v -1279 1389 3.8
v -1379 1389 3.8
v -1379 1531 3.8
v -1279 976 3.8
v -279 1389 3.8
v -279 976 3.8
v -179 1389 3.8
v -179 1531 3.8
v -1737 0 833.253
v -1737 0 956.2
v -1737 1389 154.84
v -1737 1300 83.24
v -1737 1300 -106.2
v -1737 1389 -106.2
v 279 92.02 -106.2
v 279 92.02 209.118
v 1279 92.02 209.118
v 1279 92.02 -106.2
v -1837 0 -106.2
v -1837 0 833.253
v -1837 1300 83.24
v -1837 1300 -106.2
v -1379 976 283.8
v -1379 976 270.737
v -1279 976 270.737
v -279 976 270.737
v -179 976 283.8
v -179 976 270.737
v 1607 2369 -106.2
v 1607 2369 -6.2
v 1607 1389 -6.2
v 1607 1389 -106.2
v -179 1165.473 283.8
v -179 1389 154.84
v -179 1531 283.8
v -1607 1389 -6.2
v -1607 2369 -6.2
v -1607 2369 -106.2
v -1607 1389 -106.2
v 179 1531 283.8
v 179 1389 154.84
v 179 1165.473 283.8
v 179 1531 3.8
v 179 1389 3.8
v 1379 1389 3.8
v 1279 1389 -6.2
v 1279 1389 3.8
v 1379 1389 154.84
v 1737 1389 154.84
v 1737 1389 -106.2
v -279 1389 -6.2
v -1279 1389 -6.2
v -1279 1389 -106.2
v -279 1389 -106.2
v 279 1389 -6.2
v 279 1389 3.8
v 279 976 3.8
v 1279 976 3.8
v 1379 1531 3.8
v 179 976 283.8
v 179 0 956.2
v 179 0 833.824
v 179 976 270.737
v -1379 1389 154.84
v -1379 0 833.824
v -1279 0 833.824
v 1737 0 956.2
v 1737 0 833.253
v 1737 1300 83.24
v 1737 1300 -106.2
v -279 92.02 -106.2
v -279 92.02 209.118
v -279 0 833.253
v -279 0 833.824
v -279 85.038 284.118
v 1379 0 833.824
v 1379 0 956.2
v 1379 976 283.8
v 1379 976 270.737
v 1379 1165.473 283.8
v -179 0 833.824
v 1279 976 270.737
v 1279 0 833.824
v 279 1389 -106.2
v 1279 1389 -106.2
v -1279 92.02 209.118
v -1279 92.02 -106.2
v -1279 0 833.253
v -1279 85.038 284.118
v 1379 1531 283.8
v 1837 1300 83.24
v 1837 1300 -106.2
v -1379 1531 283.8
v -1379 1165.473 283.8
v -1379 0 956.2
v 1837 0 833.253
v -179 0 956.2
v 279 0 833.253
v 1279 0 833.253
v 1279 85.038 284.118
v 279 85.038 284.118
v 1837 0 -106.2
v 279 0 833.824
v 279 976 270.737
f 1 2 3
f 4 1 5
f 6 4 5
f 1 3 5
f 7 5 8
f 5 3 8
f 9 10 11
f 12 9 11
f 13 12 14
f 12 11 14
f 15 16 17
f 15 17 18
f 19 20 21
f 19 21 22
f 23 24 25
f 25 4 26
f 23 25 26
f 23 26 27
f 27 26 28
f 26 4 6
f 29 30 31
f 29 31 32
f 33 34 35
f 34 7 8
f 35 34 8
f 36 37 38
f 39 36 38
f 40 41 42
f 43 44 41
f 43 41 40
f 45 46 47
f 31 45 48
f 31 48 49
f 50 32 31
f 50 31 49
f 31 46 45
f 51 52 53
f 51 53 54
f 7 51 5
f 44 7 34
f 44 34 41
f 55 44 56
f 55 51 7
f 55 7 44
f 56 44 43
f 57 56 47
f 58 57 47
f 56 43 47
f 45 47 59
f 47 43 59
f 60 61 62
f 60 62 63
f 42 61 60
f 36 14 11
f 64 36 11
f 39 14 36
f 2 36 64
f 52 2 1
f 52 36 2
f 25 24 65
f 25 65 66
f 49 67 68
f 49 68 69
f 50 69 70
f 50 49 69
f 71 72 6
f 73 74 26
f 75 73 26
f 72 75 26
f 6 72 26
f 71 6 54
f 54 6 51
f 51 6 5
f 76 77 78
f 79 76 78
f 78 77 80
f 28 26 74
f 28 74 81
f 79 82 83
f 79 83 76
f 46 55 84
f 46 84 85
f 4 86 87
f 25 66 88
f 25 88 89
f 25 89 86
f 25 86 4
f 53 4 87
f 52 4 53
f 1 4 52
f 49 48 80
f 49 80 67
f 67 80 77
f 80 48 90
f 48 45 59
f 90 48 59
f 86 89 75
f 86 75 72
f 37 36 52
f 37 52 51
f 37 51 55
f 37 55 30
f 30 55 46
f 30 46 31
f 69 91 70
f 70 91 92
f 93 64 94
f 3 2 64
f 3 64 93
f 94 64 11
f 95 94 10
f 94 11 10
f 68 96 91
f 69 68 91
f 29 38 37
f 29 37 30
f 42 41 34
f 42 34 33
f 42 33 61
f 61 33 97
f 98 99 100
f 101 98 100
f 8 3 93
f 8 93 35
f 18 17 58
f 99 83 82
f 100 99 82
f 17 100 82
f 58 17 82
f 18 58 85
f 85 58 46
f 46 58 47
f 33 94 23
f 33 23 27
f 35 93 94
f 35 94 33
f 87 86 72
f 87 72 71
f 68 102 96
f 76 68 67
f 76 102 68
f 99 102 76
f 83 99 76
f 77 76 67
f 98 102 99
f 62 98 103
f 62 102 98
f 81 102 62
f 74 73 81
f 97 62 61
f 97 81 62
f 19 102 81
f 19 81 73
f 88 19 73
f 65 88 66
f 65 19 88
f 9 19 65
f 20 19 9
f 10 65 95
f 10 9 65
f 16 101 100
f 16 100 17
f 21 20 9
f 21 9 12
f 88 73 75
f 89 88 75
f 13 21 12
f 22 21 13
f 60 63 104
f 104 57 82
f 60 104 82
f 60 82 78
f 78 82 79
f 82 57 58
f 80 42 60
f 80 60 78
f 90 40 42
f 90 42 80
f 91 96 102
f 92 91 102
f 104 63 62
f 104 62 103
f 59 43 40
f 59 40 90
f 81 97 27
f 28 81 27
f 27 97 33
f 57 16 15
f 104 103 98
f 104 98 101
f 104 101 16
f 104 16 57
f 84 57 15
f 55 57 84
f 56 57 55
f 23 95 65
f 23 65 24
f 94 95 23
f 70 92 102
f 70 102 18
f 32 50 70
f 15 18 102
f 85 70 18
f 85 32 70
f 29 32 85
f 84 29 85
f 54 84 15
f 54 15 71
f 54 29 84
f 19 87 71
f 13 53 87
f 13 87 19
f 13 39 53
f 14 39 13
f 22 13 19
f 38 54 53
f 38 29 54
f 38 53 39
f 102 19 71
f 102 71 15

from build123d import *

# Parameters (mm, degrees)
SKETCH_1_W           = 3674
SKETCH_1_H           = 1912.4
EXTRUDE_1_DEPTH      = 1389
CUT_EXTRUDE_1_DEPTH  = 3675
CUT_EXTRUDE_3_DEPTH  = 100
CUT_EXTRUDE_START    = -3674
CUT_EXTRUDE_4_DEPTH  = 100
SKETCH_6_W           = 3214
SKETCH_6_H           = 950
EXTRUDE_2_DEPTH      = 980
SKETCH_7_W           = 100
SKETCH_7_H           = 1603.589364395
CUT_EXTRUDE_5_DEPTH  = 106
SKETCH_8_W           = 1000
SKETCH_8_H           = 1389
CUT_EXTRUDE_6_DEPTH  = 1913.4
SKETCH_9_W           = 100
SKETCH_9_H           = 1603.589364395
CUT_EXTRUDE_7_DEPTH  = 106
SKETCH_11_W          = 100
SKETCH_11_H          = 1603.589364395
CUT_EXTRUDE_8_DEPTH  = 106
SKETCH_14_W          = 1000
SKETCH_14_H          = 1389
CUT_EXTRUDE_9_DEPTH  = 1913.4
SKETCH_16_W          = 100
SKETCH_16_H          = 1603.589364395
CUT_EXTRUDE_10_DEPTH = 106
SKETCH_18_W          = 1200
SKETCH_18_H          = 555
CUT_EXTRUDE_11_DEPTH = 953.4
SKETCH_18_2_W        = 1200
SKETCH_18_2_H        = 555
EXTRUDE_3_DEPTH      = 280
EXTRUDE_4_DEPTH      = 1000
EXTRUDE_START        = 1558
EXTRUDE_5_DEPTH      = 1000
SKETCH_23_W          = 3674
SKETCH_23_H          = 2369
CUT_EXTRUDE_12_DEPTH = 850


with BuildPart() as part:
    # 草图1 → 凸台-拉伸1 (new body)
    with BuildSketch(Plane(origin=(0, 0, 0), x_dir=(1, 0, 0), z_dir=(0, 1, 0))):
        Rectangle(SKETCH_1_W, SKETCH_1_H)
    extrude(amount=EXTRUDE_1_DEPTH)

    # 草图2 → 切除-拉伸1 (cut, through all)
    with BuildSketch(Plane.ZY.offset(1837)):
        Polygon((154.84, 1389), (956.2, 0), (956.2, 1389), align=None)
    extrude(amount=-CUT_EXTRUDE_1_DEPTH, mode=Mode.SUBTRACT)

    # 草图5 → 切除-拉伸3 (cut)
    with BuildSketch(Plane(origin=(1837, 0, 0), x_dir=(0, 0, -1), z_dir=(1, 0, 0))):
        Polygon((-154.84, 1389), (-956.2, 0), (-833.252958963, 0), (-83.24, 1300), (956.2, 1300), (956.2, 1389), align=None)
    extrude(amount=-CUT_EXTRUDE_3_DEPTH, mode=Mode.SUBTRACT)

    # 草图5<2> → 切除-拉伸4 (cut)
    with BuildSketch(Plane(origin=(1837, 0, 0), x_dir=(0, 0, -1), z_dir=(1, 0, 0)).offset(CUT_EXTRUDE_START)):
        Polygon((-154.84, 1389), (-956.2, 0), (-833.252958963, 0), (-83.24, 1300), (956.2, 1300), (956.2, 1389), align=None)
    extrude(amount=CUT_EXTRUDE_4_DEPTH, mode=Mode.SUBTRACT)

    # 草图6 → 凸台-拉伸2 (add)
    with BuildSketch(Plane(origin=(0, 1389, 0), x_dir=(1, 0, 0), z_dir=(0, 1, 0))):
        with Locations((0, 481.2)):
            Rectangle(SKETCH_6_W, SKETCH_6_H)
    extrude(amount=EXTRUDE_2_DEPTH)

    # 草图7 → 切除-拉伸5 (cut)
    with BuildSketch(Plane(origin=(0, 413.897031381, 717.409125222), x_dir=(1, 0, 0), z_dir=(0, 0.499728932, 0.866181849))):
        with Locations((-1329, 323.953877679)):
            Rectangle(SKETCH_7_W, SKETCH_7_H)
    extrude(amount=-CUT_EXTRUDE_5_DEPTH, mode=Mode.SUBTRACT)

    # 草图8 → 切除-拉伸6 (cut, through all)
    with BuildSketch(Plane.XY.offset(956.2)):
        with Locations((-779, 694.5)):
            Rectangle(SKETCH_8_W, SKETCH_8_H)
    extrude(amount=-CUT_EXTRUDE_6_DEPTH, mode=Mode.SUBTRACT)

    # 草图9 → 切除-拉伸7 (cut)
    with BuildSketch(Plane(origin=(0, 413.897031381, 717.409125222), x_dir=(1, 0, 0), z_dir=(0, 0.499728932, 0.866181849))):
        with Locations((-229, 323.953877679)):
            Rectangle(SKETCH_9_W, SKETCH_9_H)
    extrude(amount=-CUT_EXTRUDE_7_DEPTH, mode=Mode.SUBTRACT)

    # 草图11 → 切除-拉伸8 (cut)
    with BuildSketch(Plane(origin=(0, 413.897031381, 717.409125222), x_dir=(1, 0, 0), z_dir=(0, 0.499728932, 0.866181849))):
        with Locations((229, 323.953877679)):
            Rectangle(SKETCH_11_W, SKETCH_11_H)
    extrude(amount=-CUT_EXTRUDE_8_DEPTH, mode=Mode.SUBTRACT)

    # 草图14 → 切除-拉伸9 (cut, through all)
    with BuildSketch(Plane.XY.offset(956.2)):
        with Locations((779, 694.5)):
            Rectangle(SKETCH_14_W, SKETCH_14_H)
    extrude(amount=-CUT_EXTRUDE_9_DEPTH, mode=Mode.SUBTRACT)

    # 草图16 → 切除-拉伸10 (cut)
    with BuildSketch(Plane(origin=(0, 413.897031381, 717.409125222), x_dir=(1, 0, 0), z_dir=(0, 0.499728932, 0.866181849))):
        with Locations((1329, 323.953877679)):
            Rectangle(SKETCH_16_W, SKETCH_16_H)
    extrude(amount=-CUT_EXTRUDE_10_DEPTH, mode=Mode.SUBTRACT)

    # 草图18 → 切除-拉伸11 (cut, through all)
    with BuildSketch(Plane.XY.offset(3.8)):
        with Locations((-779, 1253.5)):
            Rectangle(SKETCH_18_W, SKETCH_18_H)
        with Locations((779, 1253.5)):
            Rectangle(SKETCH_18_W, SKETCH_18_H)
    extrude(amount=CUT_EXTRUDE_11_DEPTH, mode=Mode.SUBTRACT)

    # 草图18<2> → 凸台-拉伸3 (add)
    with BuildSketch(Plane.XY.offset(3.8)):
        with Locations((-779, 1253.5)):
            Rectangle(SKETCH_18_2_W, SKETCH_18_2_H)
        with Locations((779, 1253.5)):
            Rectangle(SKETCH_18_2_W, SKETCH_18_2_H)
    extrude(amount=EXTRUDE_3_DEPTH)

    # 草图21 → 凸台-拉伸4 (add)
    with BuildSketch(Plane(origin=(-1279, 0, 0), x_dir=(0, 0, -1), z_dir=(1, 0, 0))):
        Polygon((-833.252958963, 0), (-284.1184014, 85.038227225), (-209.1184014, 92.02), (956.2, 92.02), (956.2, 0), align=None)
    extrude(amount=EXTRUDE_4_DEPTH)

    # 草图21<2> → 凸台-拉伸5 (add)
    with BuildSketch(Plane(origin=(-1279, 0, 0), x_dir=(0, 0, -1), z_dir=(1, 0, 0)).offset(EXTRUDE_START)):
        Polygon((-833.252958963, 0), (-284.1184014, 85.038227225), (-209.1184014, 92.02), (956.2, 92.02), (956.2, 0), align=None)
    extrude(amount=EXTRUDE_5_DEPTH)

    # 草图23 → 切除-拉伸12 (cut)
    with BuildSketch(Plane(origin=(0, 0, -956.2), x_dir=(-1, 0, 0), z_dir=(0, 0, -1))):
        with Locations((0, 1184.5)):
            Rectangle(SKETCH_23_W, SKETCH_23_H)
    extrude(amount=-CUT_EXTRUDE_12_DEPTH, mode=Mode.SUBTRACT)


solid = part.part
